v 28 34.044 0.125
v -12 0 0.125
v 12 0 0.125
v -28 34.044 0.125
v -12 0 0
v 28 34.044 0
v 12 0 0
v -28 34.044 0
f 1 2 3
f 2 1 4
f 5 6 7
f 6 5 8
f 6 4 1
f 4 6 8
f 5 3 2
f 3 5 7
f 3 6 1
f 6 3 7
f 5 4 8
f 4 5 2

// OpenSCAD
// file: modus.scad
//Corner Joint - allows the sides of two parts to create inlayed corner. Aids with welding.
//need to verify module math is the same throughout all parts.

module cornerjoint(Z,L,H,EndGap,PadL,PadH,CJangle,CJcenter){
    //change so that H = Z of inlayed part (usually 0.5)
    //add center and angle in degrees option, orgin far side of cut out area

     if((CJangle==0)&&(CJcenter==0))
      {    
        translate([0,0,0])
        rotate([0,0,CJangle])
        difference(){
        cube([L,H+PadH,Z]);
        translate([EndGap,H,0])
        cube([PadL,PadH,Z]);
        translate([L-EndGap-PadL,H,0])
        cube([PadL,PadH,Z]);}
      }    
else if((CJangle==90)&&(CJcenter==0))
      {    
        translate([H+PadH,0,0])
        rotate([0,0,CJangle])
        difference(){
        cube([L,H+PadH,Z]);
        translate([EndGap,H,0])
        cube([PadL,PadH,Z]);
        translate([L-EndGap-PadL,H,0])
        cube([PadL,PadH,Z]);}
      }
else if((CJangle==180)&&(CJcenter==0))       
      {    
        translate([L,H+PadH,0])
        rotate([0,0,CJangle])
        difference(){
        cube([L,H+PadH,Z]);
        translate([EndGap,H,0])
        cube([PadL,PadH,Z]);
        translate([L-EndGap-PadL,H,0])
        cube([PadL,PadH,Z]);}
      }
else if((CJangle==270)&&(CJcenter==0))
      {    
        translate([0,L,0])
        rotate([0,0,CJangle])
        difference(){
        cube([L,H+PadH,Z]);
        translate([EndGap,H,0])
        cube([PadL,PadH,Z]);
        translate([L-EndGap-PadL,H,0])
        cube([PadL,PadH,Z]);}
      }  
      
//centered     
   
else if((CJangle==0)&&(CJcenter==1))
      {    
        translate([-L/2,0,0])
        rotate([0,0,CJangle])
        difference(){
        cube([L,H+PadH,Z]);
        translate([EndGap,H,0])
        cube([PadL,PadH,Z]);
        translate([L-EndGap-PadL,H,0])
        cube([PadL,PadH,Z]);}
      }  
else if((CJangle==90)&&(CJcenter==1))
      {    
        translate([0,-L/2,0])
        rotate([0,0,CJangle])
        difference(){
        cube([L,H+PadH,Z]);
        translate([EndGap,H,0])
        cube([PadL,PadH,Z]);
        translate([L-EndGap-PadL,H,0])
        cube([PadL,PadH,Z]);}
      }
else if((CJangle==180)&&(CJcenter==1))       
      {    
        translate([L/2,0,0])
        rotate([0,0,CJangle])
        difference(){
        cube([L,H+PadH,Z]);
        translate([EndGap,H,0])
        cube([PadL,PadH,Z]);
        translate([L-EndGap-PadL,H,0])
        cube([PadL,PadH,Z]);}
      }
else if((CJangle==270)&&(CJcenter==1))
      {    
        translate([0,L/2,0])
        rotate([0,0,CJangle])
        difference(){
        cube([L,H+PadH,Z]);
        translate([EndGap,H,0])
        cube([PadL,PadH,Z]);
        translate([L-EndGap-PadL,H,0])
        cube([PadL,PadH,Z]);}
      }
} //end cornerjoint module

//Tab Insert - used to cut a hole for an abutting part to insert into. Typically aids with welding the two parts.
module tabinsert(X,Y,Z,dGap,cGap,c1,c2,c3,c4,c5,c6,c7,c8,center){
    translate([-dGap-(center*(X/2)),-dGap-(center*(Y/2)),0]){
        //main cut
        cube([X+(dGap*2),Y+(dGap*2),Z]);
        //corner c1c2
        translate([-cGap,(Y+(dGap*2))-c1+cGap,0])
            {
        cube([c2,c1,Z]);}
       //corner c3c4
       translate([(X+(dGap*2))-c3+cGap,(Y+(dGap*2))-c4+cGap,0]){
           cube([c3,c4,Z]);
       }
       //corner c5c6
       translate([(X+(dGap*2))-c6+cGap,-cGap,0])
      {
          cube([c6,c5,Z]);
      }
       
       //corner c7c8 
       translate([-cGap,-cGap,0]){
           cube([c7,c8,Z]);
       }
    
    } //end center translate
} //end tabinsert module
 

module nut(flattoflat,nutheight){  //distance from one flat side to the other flat side "A/F"

//typical sizes found here:
//https://en.wikipedia.org/wiki/Nut_(hardware)

difference(){
    translate([0,0,nutheight/2])
cube(size = [10,10,nutheight], center = true);
    
for(i=[1:6]){
    rotate([0,0,i*60])
difference(){
    translate([-10,0,0])
    cube([20,20,nutheight]);
    translate([-10,0,0])
    cube([20,flattoflat/2,nutheight]);
}  //end difference
}  //end for
}  //end differeence
}  //end module
// file: vars.scad
brickW=6; 
brickL=24;
brickCH=6; //Is brick height being shortened by d1z??

//3.625 x 2.25 x 8
//6 x 12 x 6

grateX=56;
grateY=23;
grateH=37; //Height mounted above press's frame
grateA=17.5; //angle of grate

//grateX=56;
//grateY=23;
//grateH=37; //Height mounted above press's frame
//grateA=17.5; //angle of grate


$fn=8; //defines resolution of circles. 8 is okay for review. 100  or greater should be used for for final dxf export.

dZstandard=0.5; //thickness of steel to be cut for drawer parts
fZstandard=0.5;
aZstandard=0.5; //thickness of steel to be cut for arm parts
hZstandard=0.125;

fBOLTHOLEstandardD=1; //standard bolts used on frame
aBOLTHOLEstandardD=1;

sliderodholeOD=1.2; 
d1bushingOD=1.25;
d1bushingL=1.25;
d1shaftOD=1;
d1bolt1OD=1;
d1bolt2OD=0.75;
d1nut2AF=1.25;
d1nut2H=0.665;


dGap=0.03125; //gap between a hole cut's edge and the part sitting within the hole. //D3 appears to use 0.3125, is this in error?

//all parts set to standard thickness below
//off standard preferences can be defined below

//drawer
drawergap=0.0283;  //extra room for drawer to slide in the space between f1 and f4
drawerHgap=0.1884;  //total extra space from drawer sides to frame walls. sum of both sides.

d2clevispinaccessholeOD=3;

d1z=dZstandard;
d2z=dZstandard;
d3z=dZstandard;
d4z=dZstandard;
d5z=dZstandard;
d6z=dZstandard;
d5z=dZstandard;
d7z=dZstandard;
d8z=dZstandard;
d9z=dZstandard;

d11z=dZstandard;
d12z=dZstandard;


//frame

f1y=6;
f1z=fZstandard;


f2y=3.5;
f2z=fZstandard;

f3y=3.5;
f3z=fZstandard;

f4y=11;
f4z=fZstandard;

f5y=3.5;
f5z=fZstandard;

f6y=8;
f6z=fZstandard;

f8y=brickW;
f8z=fZstandard;
f8boltD=1;

f9y=4.5;

f9z=fZstandard;




f12z=fZstandard;   

f11x=1.25;
f11z=fZstandard;

f13z=fZstandard;

f14y=3.5;
f14z=fZstandard;

//arms

a1x=4;
a1z=aZstandard;
a1out=24; //length from frame to A5 edge for bricks to sit on as they exit

a2x=6;
a2z=aZstandard;

a3x=4;
a3y=72;
a3z=aZstandard;

a4x=6;
a4y=72;
a4z=aZstandard;

a5x=6;
a5y=72;
a5z=aZstandard;

a6z=aZstandard;

//guards

h1x=grateX;
h1y=grateH;  //might need to tweak for grate thickness

h1z=hZstandard;
h2z=hZstandard;
h3z=hZstandard;
h4z=hZstandard;
h5z=hZstandard;
h6z=hZstandard;
h7z=hZstandard;
h8z=hZstandard;

//
//Input your main cylinder's dimenions here
//
cylMainBore = 5;
cylMainStroke = 16;
cylMainExt = 43;
cylMainRet = 27;
cylMainA = (cylMainRet-cylMainStroke); //center to center minus stroke length
cylMainB = 0.25; // cylinder wall thickness
cylMainD = 2.5; //Rod OD
cylMainE = 5.75; //rear pin holder width
cylMainG = 4; //rod pin holder width
cylMainJ = 3.8; //distance from the end of the cylinder body to rod pin center
cylMainR = 1.52; //pin hole ID
cylMainS = 2.5; //pin holder OD

//
//Input your drawer cylinder's dimenions here
//
//
cylDrawerBore = 5;
cylDrawerStroke = 16;
cylDrawerExt = 43;
cylDrawerRet = 27;
cylDrawerA = (cylMainRet-cylMainStroke); //center to center minus stroke length
cylDrawerB = 0.25; // cylinder wall thickness
cylDrawerD = 2.5; //Rod OD
cylDrawerE = 5.75; //rear pin holder width
cylDrawerG = 4; //rod pin holder width
cylDrawerJ = 3.8; //distance from the end of the cylinder body to rod pin center
cylDrawerR = 1.52; //pin hole ID
cylDrawerS = 2.5; //pin holder OD

cylinderDRAWERbodyH=3; //measured when in position, largest length from top to bottom of cylinder
cylinderDRAWERminC2C=0; //drawer's hydraulic cylinder's distance from the center of one mounting hole to the center of the other when fully compressed.
cylinderDRAWERmaxC2C=0; ///drawer's hydraulic cylinder's distance from the center of one mounting hole to the center of the other when fully extended.
cylinderDRAWERrodclevisW=2.5; //width of cylinders' clevis on end of rod
cylinderDRAWERrodclevisID=1;
cylinderDRAWERrodclevisOD=2;
cylinderDRAWERrearclevisW=2.5; //width of mounting clevis cylinder body
cylinderDRAWERrearclevisID=1;
cylinderDRAWERrearclevisOD=2;
cylinderDRAWERrearclevisClearance=3; //usable space around rear clevis pin (in diameter). be aware of hyraulic fittings.

//the following variables are calculated in order of dependence on preceding variables

d3x=brickL+(d2z*2);
d3y=brickCH-d1z;
d4x=brickW+d3z+d3z;
d4y=brickCH-d1z;
d5x=brickL+(d2z*2);
d5y=brickW;
d6x=brickL+(d2z*2);
d6y=brickCH;
d7x=cylinderDRAWERrearclevisClearance;
d7y=a4z+d8z+cylinderDRAWERbodyH;
d9x=cylinderDRAWERbodyH+d6z; //should be based on clevis size?
d9y=cylinderDRAWERbodyH+d8z;
d8x=brickL+(d2z*2);
d8y=max(5,(d9x-d6z));   //need to review fundamentals, 5 minimun unless d9 gets larger than d8
d11x=1.5+(d1bolt1OD*2)+d1bushingOD;
d11y=max((0.5+d1bushingL),4);

d12x=d8x;
d12y=d11y+1;

f1x=((brickL+(d2z*2)+drawerHgap+(f9y*2)));
f3x=f1x;

d1x=(brickL+d2z+d2z);
//d1x=(((f1x/2)-(((brickL+(d2z*2)+drawerHgap)/2)-fZstandard-(sliderodholeOD/2)))+(d11x/2))*2;
d1y=((brickW+d3z+d3z)*3)+1;

d2x=d8y+d6z+brickW+d3z+d5y+d3z;
d2y=brickCH;



f11y=f8y;
f6x=brickL+(d2z*2)+(f9y*2)+drawerHgap;

f9x=(f2z+((cylMainS+0.125)/2)+cylMainRet-cylMainJ+1+f4y+drawergap+d2y+f1y);  //leaves 1" between top of cylinder and bottom of F4
f8x=f9x;


f2x=brickL+(d2z*2)+drawerHgap+(f9y*2)-(1.4*2);  //distance between large cut outs in f9

f5x=brickL+(d2z*2)+drawerHgap+(f9y*2)+(a1x*2); //distance between outer edges of each A1

f4x=f5x-0.5;   //same as f5 but minus 0.25 on each side to give a little overhang

f14x=brickL+(1*2)+(.125*2)+(dGap*2); 

f12x=f3x;
f12y=(f3y*2)+brickW;

sliderodoffset=(((brickL+(d2z*2)+drawerHgap)/2)-fZstandard-(sliderodholeOD/2));

distancetof8center=(cylDrawerExt+(a4x/2)+((d9x-d6z)/2)+d6z+(brickW/2)); //F8 center on A1

a1y=distancetof8center+(brickW/2)+a1out;
a2y=a1y;

h7x=f5x-((a1x/2)*2)+(1.5*2);
h7y=cylDrawerStroke;

h8x=f5x-((a1x/2)*2)+(1.5*2);
h8y=a1out-a5x-f5y;  //distance between a5 and f5

hopperBaseX=brickL;
hopperBaseY=brickW;

h2x=grateX;
h2y=sqrt(((h1y-(sin(grateA)*grateY))*(h1y-(sin(grateA)*grateY)))+(((cos(grateA)*grateY)-hopperBaseY)*((cos(grateA)*grateY)-hopperBaseY)));

//h1y-(sin(grateA)*grateY)
//(cos(grateA)*grateY)-hopperBaseY

echo(h1y-(sin(grateA)*grateY));
echo((cos(grateA)*grateY)-hopperBaseY);
echo(h2y);
echo(atan((h1y-(sin(grateA)*grateY))/((cos(grateA)*grateY)-hopperBaseY)));
echo((h1y-(sin(grateA)*grateY))/(h1y));

// ECHO - REQUIRED PARTS BASED ON INPUTS

echo(str("Minimum drawer cylinder stroke length: ",(d3z*2)+d5y+brickW));
//would be cool to validate and confirm user inputed stroke length. set error=1; if drawer cylinder is not long enough. print an echo warning.

echo(str("Grate hieght above ground level: ",(1)));
// main file
include <vars.scad>;
use <modus.scad>;

h2p();

module h2p(){
    
difference(){
    
translate([-(h2x/2),0,0])
cube([h2x,h2y,h2z]);    
translate([-(h2x/2),0,0])
cuts();
translate([(h2x/2),0,0])
mirror([1,0,0])
cuts();
} //end difference

module cuts(){


translate([h2x-((h2x-hopperBaseX)/2),0,0])
rotate([0,0,atan(h2y/((h2x-hopperBaseX)/2))])
    translate([0,-sin(atan(h2y/((h2x-hopperBaseX)/2)))*(h2x-hopperBaseX)/2,0])
cube([sqrt((((h2x-hopperBaseX)/2)*((h2x-hopperBaseX)/2))+((h2y)*(h2y))),sin(atan(h2y/((h2x-hopperBaseX)/2)))*(h2x-hopperBaseX)/2,h2z]);
    
} //end cuts module
} //end h2p module
